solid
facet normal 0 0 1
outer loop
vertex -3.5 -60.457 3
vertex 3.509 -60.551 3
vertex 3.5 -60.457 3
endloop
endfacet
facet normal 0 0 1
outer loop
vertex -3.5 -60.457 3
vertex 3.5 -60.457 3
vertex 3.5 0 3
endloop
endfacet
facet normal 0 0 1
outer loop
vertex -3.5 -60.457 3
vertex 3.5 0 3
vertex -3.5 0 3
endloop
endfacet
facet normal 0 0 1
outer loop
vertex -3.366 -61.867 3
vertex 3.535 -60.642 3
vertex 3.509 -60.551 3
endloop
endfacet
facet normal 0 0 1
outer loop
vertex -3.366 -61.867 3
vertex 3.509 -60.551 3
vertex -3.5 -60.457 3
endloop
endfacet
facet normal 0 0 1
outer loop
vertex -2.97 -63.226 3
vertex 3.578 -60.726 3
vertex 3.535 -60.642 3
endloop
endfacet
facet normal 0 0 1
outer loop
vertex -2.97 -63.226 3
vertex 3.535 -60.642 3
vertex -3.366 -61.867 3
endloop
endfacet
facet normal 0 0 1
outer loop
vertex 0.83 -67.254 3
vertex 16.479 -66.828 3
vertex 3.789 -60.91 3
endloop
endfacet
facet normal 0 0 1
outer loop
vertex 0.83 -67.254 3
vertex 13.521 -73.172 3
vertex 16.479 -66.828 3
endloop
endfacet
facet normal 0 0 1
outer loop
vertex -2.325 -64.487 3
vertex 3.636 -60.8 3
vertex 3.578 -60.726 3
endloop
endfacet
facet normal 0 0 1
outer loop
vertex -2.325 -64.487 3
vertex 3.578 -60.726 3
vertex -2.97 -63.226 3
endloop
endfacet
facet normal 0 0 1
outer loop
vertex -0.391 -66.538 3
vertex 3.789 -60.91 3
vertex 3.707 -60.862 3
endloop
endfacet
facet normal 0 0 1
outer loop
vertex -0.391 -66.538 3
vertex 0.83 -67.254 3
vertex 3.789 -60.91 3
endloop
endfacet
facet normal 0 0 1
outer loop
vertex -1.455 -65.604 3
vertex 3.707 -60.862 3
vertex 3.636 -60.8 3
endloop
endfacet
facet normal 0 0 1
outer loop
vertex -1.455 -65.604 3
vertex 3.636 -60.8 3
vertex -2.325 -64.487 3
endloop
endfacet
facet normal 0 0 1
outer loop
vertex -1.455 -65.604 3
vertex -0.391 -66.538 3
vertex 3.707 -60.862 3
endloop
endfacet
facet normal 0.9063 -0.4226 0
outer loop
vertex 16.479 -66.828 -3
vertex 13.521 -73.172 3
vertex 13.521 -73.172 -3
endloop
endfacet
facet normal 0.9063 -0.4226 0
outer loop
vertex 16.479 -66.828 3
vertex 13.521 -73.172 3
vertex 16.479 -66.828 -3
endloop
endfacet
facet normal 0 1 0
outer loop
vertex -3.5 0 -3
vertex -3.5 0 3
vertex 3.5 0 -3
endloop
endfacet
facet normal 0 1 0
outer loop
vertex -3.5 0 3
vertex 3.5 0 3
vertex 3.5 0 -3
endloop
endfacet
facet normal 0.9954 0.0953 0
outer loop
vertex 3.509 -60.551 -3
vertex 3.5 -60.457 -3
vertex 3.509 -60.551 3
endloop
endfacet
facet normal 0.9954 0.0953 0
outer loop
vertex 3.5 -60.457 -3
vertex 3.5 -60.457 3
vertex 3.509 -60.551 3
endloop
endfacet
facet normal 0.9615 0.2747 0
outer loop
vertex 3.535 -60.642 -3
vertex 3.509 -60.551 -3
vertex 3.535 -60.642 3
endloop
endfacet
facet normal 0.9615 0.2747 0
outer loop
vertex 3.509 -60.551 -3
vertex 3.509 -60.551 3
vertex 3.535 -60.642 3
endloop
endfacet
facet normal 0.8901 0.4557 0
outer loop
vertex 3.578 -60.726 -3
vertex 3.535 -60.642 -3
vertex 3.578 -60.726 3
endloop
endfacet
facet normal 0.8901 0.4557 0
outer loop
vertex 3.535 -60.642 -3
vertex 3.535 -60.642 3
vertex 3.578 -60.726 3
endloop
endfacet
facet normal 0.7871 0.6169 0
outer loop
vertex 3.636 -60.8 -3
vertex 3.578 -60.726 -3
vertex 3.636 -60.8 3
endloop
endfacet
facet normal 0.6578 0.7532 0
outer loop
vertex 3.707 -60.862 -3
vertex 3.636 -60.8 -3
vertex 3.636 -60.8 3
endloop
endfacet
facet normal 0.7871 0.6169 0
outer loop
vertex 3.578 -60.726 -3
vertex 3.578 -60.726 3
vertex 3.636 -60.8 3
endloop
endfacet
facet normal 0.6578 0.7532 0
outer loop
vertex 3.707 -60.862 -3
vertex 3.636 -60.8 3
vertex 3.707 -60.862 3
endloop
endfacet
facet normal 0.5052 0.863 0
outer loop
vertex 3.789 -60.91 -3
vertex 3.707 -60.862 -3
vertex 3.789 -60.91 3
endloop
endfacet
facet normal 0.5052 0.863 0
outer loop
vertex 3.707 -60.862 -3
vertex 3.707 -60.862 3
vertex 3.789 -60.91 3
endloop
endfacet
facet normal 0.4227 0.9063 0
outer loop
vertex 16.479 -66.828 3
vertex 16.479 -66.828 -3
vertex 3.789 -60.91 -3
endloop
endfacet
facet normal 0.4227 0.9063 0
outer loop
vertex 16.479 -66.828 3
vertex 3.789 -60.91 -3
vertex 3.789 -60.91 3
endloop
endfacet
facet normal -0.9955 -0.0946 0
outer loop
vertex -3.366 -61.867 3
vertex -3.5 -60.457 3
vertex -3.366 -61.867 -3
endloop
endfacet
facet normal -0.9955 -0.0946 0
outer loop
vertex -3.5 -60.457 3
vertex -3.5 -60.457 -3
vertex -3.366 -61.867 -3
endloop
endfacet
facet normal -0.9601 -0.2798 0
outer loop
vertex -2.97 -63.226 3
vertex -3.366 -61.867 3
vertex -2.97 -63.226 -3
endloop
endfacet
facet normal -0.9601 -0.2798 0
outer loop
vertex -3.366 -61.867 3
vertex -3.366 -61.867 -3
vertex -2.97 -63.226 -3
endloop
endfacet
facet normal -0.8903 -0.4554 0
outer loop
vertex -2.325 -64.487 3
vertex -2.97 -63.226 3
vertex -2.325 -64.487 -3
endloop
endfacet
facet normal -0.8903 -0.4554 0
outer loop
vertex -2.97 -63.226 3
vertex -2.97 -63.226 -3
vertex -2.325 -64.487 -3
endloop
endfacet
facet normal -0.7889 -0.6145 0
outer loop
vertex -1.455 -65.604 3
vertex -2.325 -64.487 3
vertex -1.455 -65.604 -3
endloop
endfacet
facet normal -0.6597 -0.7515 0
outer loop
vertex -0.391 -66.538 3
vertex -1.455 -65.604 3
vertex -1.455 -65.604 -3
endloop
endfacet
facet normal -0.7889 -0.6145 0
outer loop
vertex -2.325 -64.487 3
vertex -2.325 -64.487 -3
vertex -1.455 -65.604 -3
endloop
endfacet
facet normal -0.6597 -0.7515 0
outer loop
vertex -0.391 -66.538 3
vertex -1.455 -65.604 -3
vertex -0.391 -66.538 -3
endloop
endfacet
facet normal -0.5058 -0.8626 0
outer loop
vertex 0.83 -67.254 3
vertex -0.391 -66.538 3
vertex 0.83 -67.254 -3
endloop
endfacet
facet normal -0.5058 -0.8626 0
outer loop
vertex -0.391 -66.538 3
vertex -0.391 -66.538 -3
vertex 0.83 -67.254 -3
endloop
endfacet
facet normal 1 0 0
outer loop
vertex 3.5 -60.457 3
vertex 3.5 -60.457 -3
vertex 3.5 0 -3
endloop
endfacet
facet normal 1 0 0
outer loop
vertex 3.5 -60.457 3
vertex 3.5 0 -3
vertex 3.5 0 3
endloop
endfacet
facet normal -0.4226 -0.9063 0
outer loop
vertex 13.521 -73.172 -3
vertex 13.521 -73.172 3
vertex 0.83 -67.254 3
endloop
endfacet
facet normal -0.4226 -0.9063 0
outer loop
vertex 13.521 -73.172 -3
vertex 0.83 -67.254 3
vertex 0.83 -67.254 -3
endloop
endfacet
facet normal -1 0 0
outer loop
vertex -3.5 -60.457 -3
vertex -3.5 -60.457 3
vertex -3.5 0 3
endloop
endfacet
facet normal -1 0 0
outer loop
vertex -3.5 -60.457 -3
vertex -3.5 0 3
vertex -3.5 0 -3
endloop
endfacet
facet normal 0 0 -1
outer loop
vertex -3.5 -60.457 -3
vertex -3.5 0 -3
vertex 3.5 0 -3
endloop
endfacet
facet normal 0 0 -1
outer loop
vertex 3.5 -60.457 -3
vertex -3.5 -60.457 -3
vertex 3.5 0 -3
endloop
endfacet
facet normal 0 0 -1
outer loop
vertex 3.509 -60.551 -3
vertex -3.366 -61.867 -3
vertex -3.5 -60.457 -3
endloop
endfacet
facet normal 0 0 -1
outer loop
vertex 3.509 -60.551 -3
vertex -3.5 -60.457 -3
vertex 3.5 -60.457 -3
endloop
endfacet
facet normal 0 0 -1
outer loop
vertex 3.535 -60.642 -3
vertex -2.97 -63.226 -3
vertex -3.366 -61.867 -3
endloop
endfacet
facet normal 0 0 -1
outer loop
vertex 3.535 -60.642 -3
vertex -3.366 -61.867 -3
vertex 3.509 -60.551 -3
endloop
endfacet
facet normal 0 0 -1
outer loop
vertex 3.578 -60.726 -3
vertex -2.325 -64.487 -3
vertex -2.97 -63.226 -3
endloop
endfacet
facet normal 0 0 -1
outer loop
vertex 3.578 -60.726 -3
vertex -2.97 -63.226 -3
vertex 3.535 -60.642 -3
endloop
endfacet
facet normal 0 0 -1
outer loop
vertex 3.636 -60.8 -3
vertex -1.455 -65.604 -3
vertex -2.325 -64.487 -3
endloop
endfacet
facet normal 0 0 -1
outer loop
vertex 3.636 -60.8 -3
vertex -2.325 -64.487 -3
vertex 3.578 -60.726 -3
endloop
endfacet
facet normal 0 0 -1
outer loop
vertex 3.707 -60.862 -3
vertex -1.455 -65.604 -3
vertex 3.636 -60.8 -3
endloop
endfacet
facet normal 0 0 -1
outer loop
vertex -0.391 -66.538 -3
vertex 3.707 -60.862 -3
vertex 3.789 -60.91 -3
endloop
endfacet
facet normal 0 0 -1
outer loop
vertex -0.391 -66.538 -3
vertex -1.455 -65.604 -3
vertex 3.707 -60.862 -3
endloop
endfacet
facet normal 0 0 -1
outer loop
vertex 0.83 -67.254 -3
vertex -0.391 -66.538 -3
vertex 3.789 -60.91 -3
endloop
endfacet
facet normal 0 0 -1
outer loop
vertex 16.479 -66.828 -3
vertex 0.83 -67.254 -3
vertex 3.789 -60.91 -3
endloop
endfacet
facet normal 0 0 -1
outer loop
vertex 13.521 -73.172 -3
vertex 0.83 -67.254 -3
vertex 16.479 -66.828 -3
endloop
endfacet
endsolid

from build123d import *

# Parameters (mm, degrees)
F0_W = 7
F0_H = 6


with BuildPart() as f2:
    # F2: sweep along a path in F1
    with BuildLine(Plane.XY) as f2_path:
        Line((0, 0), (0, -60.457104))
        ThreePointArc((0, -60.457104), (0.626434, -62.606303), (2.309527, -64.082335))
        Line((2.309527, -64.082335), (15, -70))
    # F0 (on Front) → F2 (sweep)
    with BuildSketch(Plane.XZ):
        Rectangle(F0_W, F0_H)
    sweep(path=f2_path.line)


solid = f2.part
